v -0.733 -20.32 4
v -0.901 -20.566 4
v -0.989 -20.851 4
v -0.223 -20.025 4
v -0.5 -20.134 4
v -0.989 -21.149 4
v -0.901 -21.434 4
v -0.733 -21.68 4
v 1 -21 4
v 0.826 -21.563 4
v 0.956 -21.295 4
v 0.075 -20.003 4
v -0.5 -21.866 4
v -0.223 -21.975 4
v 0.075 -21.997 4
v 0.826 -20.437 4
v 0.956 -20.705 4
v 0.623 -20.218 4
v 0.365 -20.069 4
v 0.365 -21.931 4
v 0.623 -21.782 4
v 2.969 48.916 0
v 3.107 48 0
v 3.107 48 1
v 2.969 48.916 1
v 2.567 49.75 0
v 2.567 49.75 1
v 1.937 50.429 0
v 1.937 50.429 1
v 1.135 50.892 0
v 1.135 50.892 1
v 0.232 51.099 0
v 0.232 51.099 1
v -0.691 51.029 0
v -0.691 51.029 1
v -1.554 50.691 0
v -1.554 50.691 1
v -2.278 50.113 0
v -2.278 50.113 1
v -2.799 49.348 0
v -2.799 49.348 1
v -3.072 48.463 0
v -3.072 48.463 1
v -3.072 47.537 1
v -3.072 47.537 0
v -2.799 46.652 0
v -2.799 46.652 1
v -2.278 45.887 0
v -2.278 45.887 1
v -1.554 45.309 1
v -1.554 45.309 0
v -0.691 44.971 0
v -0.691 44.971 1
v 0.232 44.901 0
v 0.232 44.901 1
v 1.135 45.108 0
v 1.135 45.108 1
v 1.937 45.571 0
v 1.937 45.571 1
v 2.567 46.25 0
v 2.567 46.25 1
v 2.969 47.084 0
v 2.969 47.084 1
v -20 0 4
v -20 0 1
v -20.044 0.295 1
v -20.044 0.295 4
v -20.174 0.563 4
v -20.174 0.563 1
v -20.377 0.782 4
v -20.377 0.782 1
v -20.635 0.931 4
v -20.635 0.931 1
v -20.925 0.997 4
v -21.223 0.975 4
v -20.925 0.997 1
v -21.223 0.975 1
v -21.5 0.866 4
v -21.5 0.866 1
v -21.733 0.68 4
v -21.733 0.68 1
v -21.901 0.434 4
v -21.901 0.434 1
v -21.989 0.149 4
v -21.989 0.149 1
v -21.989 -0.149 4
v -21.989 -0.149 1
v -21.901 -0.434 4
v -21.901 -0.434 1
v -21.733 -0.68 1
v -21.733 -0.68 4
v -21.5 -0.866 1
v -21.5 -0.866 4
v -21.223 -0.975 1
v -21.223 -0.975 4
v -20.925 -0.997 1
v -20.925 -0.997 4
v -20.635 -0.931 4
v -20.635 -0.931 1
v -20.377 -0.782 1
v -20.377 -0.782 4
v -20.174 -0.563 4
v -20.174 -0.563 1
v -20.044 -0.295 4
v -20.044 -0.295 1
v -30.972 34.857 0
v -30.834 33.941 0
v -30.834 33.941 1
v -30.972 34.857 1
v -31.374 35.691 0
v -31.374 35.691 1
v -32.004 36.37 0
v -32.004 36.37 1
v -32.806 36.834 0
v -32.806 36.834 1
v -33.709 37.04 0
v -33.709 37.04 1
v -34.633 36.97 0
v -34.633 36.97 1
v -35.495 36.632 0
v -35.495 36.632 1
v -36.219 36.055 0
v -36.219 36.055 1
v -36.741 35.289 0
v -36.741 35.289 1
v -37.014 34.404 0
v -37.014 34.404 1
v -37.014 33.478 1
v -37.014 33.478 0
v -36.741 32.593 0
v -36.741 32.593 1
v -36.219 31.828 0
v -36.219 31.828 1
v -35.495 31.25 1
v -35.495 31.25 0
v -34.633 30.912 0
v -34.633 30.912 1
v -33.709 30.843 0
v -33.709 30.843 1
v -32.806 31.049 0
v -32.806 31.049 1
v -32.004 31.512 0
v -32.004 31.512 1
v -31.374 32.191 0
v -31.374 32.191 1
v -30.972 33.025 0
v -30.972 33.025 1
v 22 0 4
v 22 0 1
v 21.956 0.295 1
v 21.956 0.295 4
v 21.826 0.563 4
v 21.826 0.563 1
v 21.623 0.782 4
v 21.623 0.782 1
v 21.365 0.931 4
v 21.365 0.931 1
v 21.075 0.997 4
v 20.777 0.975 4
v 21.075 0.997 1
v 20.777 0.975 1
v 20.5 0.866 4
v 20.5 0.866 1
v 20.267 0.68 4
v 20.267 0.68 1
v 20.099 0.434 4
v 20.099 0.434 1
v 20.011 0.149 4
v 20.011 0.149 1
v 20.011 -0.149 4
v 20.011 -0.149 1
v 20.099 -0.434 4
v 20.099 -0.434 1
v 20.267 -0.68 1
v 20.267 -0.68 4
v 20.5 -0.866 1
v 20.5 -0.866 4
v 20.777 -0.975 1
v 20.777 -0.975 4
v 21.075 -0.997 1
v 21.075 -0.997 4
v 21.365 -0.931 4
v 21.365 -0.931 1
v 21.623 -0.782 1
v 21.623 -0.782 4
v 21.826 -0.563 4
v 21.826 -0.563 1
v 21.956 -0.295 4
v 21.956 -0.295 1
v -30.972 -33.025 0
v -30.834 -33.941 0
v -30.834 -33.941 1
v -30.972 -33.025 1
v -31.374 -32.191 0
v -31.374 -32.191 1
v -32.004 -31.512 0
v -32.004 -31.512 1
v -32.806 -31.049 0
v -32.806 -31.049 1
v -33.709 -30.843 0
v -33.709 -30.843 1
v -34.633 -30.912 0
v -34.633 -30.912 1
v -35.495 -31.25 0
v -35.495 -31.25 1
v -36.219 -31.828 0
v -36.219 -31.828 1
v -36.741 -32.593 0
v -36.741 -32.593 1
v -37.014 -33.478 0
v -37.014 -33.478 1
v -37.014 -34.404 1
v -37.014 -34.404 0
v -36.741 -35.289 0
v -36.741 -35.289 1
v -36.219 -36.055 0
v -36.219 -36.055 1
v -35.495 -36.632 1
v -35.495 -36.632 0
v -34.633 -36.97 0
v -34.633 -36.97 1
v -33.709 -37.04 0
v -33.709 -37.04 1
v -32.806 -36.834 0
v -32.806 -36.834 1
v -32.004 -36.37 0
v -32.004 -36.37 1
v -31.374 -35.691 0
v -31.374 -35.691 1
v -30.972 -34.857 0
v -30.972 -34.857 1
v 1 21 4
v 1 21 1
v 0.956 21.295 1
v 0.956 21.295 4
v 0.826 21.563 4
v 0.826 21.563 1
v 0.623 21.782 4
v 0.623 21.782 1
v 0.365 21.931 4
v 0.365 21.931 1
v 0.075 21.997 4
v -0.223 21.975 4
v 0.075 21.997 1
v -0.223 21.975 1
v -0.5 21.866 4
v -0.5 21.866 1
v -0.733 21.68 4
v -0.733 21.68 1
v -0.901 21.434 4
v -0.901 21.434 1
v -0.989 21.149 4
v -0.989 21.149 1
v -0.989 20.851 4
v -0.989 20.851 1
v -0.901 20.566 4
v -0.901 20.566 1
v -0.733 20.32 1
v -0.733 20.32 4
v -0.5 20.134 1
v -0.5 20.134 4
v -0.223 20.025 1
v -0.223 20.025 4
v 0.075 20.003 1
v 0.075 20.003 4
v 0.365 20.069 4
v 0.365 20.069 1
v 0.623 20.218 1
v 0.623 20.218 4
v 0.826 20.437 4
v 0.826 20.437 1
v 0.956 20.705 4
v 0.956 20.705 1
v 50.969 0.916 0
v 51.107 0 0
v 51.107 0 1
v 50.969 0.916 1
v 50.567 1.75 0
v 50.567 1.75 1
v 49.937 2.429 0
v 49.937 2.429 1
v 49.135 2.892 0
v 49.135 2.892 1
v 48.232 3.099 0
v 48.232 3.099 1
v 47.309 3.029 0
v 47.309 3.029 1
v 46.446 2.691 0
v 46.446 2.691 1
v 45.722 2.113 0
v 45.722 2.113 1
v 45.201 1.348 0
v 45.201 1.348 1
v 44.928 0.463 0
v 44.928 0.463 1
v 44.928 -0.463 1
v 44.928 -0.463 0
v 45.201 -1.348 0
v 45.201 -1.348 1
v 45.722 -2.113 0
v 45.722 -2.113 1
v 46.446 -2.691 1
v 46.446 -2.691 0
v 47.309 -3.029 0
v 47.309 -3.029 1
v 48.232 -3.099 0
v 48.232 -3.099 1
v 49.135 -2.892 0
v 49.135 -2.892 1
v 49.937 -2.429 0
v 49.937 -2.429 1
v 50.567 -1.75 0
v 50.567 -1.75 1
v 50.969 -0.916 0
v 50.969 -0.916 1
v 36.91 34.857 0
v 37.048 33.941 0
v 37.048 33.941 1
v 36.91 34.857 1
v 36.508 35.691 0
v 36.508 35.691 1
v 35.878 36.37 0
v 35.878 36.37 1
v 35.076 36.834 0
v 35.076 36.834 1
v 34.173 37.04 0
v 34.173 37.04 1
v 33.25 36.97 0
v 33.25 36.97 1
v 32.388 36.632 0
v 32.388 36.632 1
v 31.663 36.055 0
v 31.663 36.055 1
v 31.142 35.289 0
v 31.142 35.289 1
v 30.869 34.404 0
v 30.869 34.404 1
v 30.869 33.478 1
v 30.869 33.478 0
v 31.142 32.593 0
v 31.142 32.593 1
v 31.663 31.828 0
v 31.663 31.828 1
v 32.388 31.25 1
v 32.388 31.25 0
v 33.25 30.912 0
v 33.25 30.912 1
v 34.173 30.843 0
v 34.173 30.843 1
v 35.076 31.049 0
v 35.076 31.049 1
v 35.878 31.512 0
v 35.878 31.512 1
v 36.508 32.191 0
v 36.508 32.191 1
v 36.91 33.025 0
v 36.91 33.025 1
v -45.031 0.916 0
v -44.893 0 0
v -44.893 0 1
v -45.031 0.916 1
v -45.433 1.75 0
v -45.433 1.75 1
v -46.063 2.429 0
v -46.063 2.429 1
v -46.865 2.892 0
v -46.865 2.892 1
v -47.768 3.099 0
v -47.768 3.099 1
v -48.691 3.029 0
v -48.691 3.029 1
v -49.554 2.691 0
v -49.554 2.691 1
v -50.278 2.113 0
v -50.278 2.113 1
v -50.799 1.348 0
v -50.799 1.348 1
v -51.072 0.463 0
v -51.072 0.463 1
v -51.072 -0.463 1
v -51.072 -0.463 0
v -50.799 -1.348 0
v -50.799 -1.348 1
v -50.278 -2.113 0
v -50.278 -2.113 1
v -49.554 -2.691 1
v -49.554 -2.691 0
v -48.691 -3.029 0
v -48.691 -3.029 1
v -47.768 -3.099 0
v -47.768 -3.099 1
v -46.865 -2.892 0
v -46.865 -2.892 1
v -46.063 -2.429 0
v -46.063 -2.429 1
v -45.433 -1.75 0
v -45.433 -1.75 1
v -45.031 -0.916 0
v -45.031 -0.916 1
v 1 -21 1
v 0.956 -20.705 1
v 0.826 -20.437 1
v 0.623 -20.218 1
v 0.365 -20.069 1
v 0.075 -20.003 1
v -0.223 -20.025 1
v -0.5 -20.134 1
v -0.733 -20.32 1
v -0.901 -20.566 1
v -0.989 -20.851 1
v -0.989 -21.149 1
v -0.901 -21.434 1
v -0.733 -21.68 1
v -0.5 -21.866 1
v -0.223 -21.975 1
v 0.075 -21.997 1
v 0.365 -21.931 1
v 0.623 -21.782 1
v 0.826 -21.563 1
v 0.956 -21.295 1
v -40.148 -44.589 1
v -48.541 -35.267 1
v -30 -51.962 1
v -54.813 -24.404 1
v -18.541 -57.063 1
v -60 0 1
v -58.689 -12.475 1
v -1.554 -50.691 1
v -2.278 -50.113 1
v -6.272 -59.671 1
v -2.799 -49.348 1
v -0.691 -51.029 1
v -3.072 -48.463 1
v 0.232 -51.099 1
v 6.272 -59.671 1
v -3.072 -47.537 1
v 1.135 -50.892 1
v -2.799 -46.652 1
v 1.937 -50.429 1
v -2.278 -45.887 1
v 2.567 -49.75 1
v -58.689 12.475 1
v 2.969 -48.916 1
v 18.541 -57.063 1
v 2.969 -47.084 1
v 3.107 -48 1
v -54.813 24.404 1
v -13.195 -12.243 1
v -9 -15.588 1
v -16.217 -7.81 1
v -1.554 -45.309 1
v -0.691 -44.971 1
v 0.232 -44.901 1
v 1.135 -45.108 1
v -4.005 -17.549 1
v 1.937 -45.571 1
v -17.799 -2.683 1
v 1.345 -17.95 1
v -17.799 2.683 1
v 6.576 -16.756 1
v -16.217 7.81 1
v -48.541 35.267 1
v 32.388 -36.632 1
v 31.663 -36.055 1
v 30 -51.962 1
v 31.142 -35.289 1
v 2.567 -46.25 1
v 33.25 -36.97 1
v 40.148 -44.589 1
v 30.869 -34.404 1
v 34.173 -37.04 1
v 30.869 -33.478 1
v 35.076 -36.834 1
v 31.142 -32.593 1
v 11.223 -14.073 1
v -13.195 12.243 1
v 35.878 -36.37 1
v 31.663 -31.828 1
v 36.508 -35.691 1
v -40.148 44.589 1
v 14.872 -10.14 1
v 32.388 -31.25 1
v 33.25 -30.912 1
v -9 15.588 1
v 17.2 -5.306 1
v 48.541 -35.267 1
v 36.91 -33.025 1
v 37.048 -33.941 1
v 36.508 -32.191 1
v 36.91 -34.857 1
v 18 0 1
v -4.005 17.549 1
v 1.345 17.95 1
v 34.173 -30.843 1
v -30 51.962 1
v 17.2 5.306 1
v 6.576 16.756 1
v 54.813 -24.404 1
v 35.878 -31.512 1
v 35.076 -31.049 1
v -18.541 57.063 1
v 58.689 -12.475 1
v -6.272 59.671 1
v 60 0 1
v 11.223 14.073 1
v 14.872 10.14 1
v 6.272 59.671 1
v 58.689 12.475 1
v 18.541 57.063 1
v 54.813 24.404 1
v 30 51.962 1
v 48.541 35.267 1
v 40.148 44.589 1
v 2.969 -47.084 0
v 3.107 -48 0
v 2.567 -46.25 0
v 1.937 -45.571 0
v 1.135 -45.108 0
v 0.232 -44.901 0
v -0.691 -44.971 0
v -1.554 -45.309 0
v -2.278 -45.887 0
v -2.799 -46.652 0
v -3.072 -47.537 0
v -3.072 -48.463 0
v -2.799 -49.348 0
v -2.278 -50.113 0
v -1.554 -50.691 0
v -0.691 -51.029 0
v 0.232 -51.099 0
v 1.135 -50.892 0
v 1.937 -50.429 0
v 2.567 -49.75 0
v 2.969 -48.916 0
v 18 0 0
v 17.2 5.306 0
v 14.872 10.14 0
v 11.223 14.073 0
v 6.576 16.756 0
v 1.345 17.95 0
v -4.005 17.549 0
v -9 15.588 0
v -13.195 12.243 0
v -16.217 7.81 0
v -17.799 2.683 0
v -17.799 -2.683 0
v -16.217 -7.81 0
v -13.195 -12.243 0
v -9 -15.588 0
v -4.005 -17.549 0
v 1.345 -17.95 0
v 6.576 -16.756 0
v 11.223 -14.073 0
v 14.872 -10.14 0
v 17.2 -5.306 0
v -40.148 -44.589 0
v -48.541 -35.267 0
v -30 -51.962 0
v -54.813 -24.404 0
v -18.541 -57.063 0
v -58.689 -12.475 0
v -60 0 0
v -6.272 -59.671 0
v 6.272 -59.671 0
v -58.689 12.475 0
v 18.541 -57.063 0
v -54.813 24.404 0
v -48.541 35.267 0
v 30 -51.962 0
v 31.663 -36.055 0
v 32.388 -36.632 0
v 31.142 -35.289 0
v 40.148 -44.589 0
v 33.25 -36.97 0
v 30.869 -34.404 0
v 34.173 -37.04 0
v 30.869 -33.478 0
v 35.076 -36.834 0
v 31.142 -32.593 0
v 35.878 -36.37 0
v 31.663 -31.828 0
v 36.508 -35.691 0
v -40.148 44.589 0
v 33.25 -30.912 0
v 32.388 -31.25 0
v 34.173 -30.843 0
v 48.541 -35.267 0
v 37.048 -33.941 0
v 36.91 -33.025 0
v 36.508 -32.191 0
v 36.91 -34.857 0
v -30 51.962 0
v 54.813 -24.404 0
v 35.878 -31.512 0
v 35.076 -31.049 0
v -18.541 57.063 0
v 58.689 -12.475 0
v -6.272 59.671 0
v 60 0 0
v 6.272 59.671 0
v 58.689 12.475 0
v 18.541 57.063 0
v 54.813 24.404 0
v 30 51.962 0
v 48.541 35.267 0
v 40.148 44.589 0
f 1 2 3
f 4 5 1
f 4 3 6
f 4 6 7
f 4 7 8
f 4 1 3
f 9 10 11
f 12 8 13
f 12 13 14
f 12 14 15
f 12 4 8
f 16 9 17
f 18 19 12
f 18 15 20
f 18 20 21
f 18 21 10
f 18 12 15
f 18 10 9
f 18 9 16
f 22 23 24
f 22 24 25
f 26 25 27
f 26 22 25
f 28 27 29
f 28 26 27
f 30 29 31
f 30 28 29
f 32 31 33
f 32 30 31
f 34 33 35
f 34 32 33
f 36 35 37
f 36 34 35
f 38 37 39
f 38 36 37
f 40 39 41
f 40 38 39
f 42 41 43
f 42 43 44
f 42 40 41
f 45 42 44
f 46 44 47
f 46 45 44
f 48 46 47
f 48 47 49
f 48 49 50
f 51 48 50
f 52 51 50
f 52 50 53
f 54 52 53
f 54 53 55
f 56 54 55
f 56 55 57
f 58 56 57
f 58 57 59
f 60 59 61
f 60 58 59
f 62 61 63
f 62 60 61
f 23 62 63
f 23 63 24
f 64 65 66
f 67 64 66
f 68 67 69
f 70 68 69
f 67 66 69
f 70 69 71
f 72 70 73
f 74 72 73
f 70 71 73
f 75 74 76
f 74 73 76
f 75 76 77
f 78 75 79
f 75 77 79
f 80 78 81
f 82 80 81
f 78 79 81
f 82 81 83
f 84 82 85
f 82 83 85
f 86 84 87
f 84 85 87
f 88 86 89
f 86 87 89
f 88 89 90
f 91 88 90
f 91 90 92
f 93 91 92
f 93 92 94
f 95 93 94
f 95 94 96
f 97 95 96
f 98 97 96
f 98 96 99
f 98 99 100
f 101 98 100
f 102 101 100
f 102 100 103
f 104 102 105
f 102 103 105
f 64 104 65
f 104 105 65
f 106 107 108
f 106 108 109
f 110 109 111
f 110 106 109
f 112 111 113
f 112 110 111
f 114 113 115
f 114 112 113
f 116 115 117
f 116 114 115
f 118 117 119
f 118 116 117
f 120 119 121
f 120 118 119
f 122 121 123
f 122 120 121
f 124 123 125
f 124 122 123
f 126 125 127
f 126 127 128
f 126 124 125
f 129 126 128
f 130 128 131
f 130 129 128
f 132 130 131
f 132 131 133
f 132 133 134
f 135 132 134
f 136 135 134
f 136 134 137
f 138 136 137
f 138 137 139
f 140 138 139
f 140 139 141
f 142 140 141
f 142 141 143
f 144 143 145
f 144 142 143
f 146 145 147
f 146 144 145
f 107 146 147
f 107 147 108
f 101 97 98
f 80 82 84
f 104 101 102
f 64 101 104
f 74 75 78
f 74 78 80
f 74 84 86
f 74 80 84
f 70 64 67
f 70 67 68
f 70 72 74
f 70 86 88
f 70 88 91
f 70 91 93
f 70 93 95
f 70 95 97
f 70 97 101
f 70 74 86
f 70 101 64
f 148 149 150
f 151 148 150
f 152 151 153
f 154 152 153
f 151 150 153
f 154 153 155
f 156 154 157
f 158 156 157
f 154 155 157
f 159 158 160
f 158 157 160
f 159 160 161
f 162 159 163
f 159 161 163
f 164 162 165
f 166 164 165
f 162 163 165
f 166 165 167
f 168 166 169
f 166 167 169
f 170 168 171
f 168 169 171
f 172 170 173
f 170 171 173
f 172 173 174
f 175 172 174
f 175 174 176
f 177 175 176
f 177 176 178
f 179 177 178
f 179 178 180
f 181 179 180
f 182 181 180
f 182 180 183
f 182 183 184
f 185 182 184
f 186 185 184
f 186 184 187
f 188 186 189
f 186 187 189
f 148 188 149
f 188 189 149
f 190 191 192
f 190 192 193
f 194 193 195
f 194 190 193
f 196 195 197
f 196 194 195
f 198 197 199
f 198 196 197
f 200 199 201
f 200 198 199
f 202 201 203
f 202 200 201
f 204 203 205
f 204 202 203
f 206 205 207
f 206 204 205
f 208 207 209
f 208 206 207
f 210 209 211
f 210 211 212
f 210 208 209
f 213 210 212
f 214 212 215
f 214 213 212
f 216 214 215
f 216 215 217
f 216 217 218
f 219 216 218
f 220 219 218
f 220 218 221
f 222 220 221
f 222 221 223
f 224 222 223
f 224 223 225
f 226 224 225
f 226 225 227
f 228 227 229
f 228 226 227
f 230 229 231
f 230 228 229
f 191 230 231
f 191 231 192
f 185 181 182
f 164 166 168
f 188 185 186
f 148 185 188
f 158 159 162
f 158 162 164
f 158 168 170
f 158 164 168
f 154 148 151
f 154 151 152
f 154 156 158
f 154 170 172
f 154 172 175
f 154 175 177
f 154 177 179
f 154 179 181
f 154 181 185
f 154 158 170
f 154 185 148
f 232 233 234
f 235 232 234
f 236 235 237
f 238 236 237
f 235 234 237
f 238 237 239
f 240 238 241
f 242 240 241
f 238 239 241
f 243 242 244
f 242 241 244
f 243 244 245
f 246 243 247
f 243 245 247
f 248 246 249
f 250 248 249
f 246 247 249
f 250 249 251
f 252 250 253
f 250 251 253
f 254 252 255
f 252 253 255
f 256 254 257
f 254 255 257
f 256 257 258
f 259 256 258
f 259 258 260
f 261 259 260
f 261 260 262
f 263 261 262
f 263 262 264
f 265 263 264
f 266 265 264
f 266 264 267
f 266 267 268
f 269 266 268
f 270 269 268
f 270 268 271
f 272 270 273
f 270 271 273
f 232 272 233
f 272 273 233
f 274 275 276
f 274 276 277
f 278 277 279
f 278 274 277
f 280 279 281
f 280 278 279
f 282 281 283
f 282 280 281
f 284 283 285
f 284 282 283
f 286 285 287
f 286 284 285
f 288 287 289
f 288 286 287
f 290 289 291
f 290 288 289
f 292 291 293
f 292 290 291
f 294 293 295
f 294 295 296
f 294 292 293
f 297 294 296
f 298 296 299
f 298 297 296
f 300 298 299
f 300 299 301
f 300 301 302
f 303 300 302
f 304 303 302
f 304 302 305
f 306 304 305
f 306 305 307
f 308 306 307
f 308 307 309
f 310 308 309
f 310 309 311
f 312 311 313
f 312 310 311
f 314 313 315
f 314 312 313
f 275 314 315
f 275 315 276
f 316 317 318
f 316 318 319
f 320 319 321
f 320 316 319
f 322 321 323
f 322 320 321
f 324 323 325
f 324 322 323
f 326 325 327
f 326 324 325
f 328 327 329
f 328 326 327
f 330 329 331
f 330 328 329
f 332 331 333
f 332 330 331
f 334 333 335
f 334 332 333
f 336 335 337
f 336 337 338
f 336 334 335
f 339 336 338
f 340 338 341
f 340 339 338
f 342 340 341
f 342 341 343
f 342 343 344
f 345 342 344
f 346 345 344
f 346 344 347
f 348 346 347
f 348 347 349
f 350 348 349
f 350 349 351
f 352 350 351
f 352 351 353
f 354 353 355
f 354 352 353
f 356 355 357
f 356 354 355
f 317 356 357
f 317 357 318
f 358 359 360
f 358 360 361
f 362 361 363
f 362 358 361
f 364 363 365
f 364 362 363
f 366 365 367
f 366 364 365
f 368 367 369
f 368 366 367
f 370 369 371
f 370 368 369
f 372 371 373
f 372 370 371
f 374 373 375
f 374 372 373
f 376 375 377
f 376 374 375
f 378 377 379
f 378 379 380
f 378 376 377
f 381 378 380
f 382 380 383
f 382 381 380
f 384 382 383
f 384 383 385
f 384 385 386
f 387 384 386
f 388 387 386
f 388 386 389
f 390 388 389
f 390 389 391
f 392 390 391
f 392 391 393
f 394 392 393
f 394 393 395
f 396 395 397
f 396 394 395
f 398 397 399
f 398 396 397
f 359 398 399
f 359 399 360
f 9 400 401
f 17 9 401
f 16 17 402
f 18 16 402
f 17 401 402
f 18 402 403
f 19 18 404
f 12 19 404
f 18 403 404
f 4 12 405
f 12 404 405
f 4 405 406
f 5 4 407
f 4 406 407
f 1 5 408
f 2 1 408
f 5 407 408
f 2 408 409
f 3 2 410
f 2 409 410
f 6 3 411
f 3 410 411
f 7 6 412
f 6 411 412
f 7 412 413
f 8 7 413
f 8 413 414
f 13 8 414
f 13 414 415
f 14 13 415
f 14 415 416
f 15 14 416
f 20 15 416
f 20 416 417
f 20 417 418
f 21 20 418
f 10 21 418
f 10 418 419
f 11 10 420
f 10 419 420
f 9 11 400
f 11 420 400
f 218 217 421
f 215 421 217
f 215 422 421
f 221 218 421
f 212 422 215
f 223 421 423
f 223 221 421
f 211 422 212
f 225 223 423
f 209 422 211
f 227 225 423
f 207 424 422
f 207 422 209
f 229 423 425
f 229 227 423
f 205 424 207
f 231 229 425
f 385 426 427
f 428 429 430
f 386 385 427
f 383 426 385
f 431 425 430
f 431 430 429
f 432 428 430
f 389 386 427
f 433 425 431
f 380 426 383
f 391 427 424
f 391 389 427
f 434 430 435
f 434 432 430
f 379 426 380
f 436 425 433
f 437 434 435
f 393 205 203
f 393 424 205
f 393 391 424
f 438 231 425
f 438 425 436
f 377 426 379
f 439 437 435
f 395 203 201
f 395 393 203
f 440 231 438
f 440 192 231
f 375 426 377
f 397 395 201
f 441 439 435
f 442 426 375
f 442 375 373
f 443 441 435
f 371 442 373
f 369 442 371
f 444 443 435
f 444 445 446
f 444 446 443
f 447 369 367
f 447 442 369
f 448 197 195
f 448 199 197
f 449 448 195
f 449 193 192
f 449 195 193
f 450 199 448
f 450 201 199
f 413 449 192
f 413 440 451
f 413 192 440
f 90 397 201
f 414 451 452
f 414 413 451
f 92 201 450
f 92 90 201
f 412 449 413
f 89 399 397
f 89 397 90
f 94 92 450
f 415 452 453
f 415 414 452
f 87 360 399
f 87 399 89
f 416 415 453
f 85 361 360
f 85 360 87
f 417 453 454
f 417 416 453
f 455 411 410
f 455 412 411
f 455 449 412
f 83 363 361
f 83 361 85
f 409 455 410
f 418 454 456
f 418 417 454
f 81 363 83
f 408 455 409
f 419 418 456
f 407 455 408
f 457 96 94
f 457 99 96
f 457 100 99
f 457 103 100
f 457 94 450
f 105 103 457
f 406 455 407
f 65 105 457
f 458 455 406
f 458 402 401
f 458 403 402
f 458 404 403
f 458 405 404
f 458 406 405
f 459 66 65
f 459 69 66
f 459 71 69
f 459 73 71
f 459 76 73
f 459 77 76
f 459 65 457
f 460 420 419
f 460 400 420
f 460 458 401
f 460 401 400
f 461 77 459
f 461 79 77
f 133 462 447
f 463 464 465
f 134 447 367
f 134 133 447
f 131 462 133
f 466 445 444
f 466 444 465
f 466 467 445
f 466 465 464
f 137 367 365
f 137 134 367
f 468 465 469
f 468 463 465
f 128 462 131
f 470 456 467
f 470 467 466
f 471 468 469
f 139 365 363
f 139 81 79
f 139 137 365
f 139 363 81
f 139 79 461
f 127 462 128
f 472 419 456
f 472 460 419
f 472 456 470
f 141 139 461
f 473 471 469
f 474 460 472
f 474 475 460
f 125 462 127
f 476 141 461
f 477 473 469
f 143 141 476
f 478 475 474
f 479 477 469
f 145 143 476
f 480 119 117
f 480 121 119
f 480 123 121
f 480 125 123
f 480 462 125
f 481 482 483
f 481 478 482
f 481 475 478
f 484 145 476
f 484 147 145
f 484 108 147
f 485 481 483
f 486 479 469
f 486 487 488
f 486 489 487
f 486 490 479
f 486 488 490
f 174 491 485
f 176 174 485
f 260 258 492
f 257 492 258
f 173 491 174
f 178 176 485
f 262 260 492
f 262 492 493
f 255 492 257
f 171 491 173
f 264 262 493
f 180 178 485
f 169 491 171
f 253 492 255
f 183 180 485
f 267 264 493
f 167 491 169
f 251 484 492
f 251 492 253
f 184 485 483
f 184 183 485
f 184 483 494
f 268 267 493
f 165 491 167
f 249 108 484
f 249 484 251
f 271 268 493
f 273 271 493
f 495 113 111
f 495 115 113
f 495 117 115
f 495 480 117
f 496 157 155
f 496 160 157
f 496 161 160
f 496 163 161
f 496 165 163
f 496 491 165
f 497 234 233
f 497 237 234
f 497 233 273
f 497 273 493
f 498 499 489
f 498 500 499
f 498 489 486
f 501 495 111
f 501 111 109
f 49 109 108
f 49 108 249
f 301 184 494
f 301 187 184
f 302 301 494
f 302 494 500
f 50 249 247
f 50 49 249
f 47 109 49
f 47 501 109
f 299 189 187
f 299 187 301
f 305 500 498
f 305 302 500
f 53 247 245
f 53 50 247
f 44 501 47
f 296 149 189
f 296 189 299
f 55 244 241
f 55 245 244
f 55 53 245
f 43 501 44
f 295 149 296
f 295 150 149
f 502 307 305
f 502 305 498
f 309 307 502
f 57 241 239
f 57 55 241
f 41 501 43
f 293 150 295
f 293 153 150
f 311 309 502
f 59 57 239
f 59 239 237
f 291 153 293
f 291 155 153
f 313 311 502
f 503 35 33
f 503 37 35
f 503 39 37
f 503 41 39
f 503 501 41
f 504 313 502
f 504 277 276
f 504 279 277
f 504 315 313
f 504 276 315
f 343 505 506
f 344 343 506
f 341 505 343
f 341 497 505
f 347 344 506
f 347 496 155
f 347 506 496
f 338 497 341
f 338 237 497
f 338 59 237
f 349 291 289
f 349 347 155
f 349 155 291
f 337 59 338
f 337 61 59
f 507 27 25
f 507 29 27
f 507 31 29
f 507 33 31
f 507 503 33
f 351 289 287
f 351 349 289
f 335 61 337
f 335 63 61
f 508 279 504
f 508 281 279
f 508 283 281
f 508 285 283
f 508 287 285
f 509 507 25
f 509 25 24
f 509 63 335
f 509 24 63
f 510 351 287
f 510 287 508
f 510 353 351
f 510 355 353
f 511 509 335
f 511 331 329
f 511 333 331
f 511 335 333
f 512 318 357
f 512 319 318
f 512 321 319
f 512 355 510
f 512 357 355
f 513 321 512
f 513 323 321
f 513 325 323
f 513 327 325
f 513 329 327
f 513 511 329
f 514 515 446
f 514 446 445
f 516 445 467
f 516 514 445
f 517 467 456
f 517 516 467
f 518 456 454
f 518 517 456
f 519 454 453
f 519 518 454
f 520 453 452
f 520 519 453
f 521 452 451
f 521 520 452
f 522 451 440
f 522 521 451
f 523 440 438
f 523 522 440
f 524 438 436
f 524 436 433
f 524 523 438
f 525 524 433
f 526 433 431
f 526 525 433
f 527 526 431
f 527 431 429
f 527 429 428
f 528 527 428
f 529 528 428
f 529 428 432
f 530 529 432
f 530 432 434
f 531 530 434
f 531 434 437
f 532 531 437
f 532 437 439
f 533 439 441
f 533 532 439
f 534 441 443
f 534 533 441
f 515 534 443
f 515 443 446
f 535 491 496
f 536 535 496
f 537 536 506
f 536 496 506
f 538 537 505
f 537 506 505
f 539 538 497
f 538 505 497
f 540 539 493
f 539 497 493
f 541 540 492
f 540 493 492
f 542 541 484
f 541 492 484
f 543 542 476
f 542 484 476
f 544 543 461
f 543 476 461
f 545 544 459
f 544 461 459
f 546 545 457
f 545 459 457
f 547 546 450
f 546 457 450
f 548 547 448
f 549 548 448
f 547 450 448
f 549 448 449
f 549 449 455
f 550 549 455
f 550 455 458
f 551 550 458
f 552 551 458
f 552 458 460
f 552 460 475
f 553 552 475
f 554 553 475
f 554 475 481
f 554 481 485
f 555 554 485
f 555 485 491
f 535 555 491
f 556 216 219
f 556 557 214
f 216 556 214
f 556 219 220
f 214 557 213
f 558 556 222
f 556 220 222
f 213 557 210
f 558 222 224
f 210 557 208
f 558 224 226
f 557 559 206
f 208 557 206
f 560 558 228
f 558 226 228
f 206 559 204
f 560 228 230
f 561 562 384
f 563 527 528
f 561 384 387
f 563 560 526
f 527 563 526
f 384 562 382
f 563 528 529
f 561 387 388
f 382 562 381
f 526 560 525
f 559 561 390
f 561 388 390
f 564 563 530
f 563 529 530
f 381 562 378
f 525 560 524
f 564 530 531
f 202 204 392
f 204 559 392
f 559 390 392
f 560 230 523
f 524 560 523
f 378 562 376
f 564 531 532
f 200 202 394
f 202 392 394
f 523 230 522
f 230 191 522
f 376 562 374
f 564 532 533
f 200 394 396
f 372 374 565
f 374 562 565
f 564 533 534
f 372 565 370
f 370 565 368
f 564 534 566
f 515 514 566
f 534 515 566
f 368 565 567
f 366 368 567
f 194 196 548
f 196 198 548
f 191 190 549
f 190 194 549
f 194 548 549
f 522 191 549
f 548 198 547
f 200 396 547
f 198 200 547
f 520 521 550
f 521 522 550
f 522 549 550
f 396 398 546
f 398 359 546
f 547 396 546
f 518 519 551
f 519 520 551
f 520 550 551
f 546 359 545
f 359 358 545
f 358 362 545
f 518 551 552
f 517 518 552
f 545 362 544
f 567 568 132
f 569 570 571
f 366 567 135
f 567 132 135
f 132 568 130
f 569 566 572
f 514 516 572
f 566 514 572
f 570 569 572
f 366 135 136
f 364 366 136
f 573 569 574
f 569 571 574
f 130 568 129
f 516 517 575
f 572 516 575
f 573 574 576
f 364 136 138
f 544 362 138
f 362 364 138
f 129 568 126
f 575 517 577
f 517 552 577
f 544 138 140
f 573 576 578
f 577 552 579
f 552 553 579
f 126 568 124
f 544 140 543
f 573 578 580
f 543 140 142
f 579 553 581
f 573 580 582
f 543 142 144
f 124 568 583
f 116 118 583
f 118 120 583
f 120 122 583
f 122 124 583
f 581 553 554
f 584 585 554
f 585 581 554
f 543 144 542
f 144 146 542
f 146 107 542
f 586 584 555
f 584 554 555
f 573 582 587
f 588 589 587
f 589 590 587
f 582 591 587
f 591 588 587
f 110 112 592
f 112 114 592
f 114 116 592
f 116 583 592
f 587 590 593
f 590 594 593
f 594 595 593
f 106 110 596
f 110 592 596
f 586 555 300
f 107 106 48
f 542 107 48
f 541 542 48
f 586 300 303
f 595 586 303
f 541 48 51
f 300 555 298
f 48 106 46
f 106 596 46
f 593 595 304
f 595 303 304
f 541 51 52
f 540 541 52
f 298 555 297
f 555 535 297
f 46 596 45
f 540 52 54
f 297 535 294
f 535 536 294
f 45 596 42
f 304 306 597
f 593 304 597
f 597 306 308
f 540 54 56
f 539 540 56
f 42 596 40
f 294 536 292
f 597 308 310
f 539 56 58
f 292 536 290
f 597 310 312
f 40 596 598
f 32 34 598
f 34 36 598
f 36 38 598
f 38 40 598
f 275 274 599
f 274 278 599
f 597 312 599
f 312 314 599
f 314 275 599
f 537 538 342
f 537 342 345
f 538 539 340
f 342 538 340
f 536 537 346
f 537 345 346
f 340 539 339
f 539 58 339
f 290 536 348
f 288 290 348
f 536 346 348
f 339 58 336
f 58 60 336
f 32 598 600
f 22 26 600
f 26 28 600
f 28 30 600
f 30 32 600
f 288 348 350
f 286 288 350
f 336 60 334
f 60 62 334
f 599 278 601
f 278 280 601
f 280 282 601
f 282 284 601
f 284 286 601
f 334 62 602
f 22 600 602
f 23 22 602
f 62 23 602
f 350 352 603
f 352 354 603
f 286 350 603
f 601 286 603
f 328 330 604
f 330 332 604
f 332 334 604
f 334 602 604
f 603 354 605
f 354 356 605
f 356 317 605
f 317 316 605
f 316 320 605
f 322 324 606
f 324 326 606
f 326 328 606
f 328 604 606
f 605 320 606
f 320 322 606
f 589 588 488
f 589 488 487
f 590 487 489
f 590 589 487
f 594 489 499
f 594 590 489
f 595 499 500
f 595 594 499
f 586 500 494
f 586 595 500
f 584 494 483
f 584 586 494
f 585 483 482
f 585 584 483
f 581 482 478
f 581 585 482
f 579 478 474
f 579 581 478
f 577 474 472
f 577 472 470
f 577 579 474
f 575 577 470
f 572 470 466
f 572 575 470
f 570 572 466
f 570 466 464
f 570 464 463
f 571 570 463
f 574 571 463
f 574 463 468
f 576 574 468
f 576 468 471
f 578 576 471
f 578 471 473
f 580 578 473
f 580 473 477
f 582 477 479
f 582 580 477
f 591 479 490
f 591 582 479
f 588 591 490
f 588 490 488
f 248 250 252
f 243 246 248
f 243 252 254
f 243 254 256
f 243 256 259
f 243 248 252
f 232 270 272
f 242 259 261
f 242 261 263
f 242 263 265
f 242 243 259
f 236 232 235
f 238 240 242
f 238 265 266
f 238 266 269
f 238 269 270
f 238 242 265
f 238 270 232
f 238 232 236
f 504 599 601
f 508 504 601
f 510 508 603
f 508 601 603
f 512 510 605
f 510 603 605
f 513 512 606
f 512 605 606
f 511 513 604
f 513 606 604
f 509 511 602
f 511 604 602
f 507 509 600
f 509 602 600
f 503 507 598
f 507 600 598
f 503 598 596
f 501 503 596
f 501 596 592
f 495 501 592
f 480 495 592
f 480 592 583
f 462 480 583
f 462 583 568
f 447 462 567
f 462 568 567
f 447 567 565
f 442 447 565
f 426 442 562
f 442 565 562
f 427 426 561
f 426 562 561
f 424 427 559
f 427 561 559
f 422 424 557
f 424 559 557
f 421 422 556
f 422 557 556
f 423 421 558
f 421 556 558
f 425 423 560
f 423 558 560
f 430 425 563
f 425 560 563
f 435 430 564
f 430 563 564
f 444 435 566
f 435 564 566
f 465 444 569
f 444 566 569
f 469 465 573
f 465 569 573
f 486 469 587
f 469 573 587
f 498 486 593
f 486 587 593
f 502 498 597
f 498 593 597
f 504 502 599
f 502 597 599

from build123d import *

# Parameters (mm, degrees)
SKETCH1_R           = 60
SKETCH1_R_2         = 12.7
SKETCH1_R_3         = 3.107194875
BOSS_EXTRUDE4_DEPTH = 1
SKETCH4_R           = 1
BOSS_EXTRUDE5_DEPTH = 3
SKETCH5_R           = 18
CUT_EXTRUDE1_DEPTH  = 3


with BuildPart() as part:
    # Sketch1 → Boss-Extrude4 (new body)
    with BuildSketch(Plane.XY):
        Circle(SKETCH1_R)
        Circle(SKETCH1_R_2, mode=Mode.SUBTRACT)
        with Locations((0, 48)):
            Circle(SKETCH1_R_3, mode=Mode.SUBTRACT)
        with Locations((33.941125497, 33.941125497)):
            Circle(SKETCH1_R_3, mode=Mode.SUBTRACT)
        with Locations((48, 0)):
            Circle(SKETCH1_R_3, mode=Mode.SUBTRACT)
        with Locations((33.941125497, -33.941125497)):
            Circle(SKETCH1_R_3, mode=Mode.SUBTRACT)
        with Locations((0, -48)):
            Circle(SKETCH1_R_3, mode=Mode.SUBTRACT)
        with Locations((-33.941125497, -33.941125497)):
            Circle(SKETCH1_R_3, mode=Mode.SUBTRACT)
        with Locations((-48, 0)):
            Circle(SKETCH1_R_3, mode=Mode.SUBTRACT)
        with Locations((-33.941125497, 33.941125497)):
            Circle(SKETCH1_R_3, mode=Mode.SUBTRACT)
    extrude(amount=BOSS_EXTRUDE4_DEPTH)

    # Sketch4 → Boss-Extrude5 (add)
    with BuildSketch(Plane.XY.offset(1)):
        with Locations((0, 21)):
            Circle(SKETCH4_R)
        with Locations((21, 0)):
            Circle(SKETCH4_R)
        with Locations((0, -21)):
            Circle(SKETCH4_R)
        with Locations((-21, 0)):
            Circle(SKETCH4_R)
    extrude(amount=BOSS_EXTRUDE5_DEPTH)

    # Sketch5 → Cut-Extrude1 (cut)
    with BuildSketch(Plane.XY.offset(1)):
        Circle(SKETCH5_R)
    extrude(amount=-CUT_EXTRUDE1_DEPTH, mode=Mode.SUBTRACT)


solid = part.part
